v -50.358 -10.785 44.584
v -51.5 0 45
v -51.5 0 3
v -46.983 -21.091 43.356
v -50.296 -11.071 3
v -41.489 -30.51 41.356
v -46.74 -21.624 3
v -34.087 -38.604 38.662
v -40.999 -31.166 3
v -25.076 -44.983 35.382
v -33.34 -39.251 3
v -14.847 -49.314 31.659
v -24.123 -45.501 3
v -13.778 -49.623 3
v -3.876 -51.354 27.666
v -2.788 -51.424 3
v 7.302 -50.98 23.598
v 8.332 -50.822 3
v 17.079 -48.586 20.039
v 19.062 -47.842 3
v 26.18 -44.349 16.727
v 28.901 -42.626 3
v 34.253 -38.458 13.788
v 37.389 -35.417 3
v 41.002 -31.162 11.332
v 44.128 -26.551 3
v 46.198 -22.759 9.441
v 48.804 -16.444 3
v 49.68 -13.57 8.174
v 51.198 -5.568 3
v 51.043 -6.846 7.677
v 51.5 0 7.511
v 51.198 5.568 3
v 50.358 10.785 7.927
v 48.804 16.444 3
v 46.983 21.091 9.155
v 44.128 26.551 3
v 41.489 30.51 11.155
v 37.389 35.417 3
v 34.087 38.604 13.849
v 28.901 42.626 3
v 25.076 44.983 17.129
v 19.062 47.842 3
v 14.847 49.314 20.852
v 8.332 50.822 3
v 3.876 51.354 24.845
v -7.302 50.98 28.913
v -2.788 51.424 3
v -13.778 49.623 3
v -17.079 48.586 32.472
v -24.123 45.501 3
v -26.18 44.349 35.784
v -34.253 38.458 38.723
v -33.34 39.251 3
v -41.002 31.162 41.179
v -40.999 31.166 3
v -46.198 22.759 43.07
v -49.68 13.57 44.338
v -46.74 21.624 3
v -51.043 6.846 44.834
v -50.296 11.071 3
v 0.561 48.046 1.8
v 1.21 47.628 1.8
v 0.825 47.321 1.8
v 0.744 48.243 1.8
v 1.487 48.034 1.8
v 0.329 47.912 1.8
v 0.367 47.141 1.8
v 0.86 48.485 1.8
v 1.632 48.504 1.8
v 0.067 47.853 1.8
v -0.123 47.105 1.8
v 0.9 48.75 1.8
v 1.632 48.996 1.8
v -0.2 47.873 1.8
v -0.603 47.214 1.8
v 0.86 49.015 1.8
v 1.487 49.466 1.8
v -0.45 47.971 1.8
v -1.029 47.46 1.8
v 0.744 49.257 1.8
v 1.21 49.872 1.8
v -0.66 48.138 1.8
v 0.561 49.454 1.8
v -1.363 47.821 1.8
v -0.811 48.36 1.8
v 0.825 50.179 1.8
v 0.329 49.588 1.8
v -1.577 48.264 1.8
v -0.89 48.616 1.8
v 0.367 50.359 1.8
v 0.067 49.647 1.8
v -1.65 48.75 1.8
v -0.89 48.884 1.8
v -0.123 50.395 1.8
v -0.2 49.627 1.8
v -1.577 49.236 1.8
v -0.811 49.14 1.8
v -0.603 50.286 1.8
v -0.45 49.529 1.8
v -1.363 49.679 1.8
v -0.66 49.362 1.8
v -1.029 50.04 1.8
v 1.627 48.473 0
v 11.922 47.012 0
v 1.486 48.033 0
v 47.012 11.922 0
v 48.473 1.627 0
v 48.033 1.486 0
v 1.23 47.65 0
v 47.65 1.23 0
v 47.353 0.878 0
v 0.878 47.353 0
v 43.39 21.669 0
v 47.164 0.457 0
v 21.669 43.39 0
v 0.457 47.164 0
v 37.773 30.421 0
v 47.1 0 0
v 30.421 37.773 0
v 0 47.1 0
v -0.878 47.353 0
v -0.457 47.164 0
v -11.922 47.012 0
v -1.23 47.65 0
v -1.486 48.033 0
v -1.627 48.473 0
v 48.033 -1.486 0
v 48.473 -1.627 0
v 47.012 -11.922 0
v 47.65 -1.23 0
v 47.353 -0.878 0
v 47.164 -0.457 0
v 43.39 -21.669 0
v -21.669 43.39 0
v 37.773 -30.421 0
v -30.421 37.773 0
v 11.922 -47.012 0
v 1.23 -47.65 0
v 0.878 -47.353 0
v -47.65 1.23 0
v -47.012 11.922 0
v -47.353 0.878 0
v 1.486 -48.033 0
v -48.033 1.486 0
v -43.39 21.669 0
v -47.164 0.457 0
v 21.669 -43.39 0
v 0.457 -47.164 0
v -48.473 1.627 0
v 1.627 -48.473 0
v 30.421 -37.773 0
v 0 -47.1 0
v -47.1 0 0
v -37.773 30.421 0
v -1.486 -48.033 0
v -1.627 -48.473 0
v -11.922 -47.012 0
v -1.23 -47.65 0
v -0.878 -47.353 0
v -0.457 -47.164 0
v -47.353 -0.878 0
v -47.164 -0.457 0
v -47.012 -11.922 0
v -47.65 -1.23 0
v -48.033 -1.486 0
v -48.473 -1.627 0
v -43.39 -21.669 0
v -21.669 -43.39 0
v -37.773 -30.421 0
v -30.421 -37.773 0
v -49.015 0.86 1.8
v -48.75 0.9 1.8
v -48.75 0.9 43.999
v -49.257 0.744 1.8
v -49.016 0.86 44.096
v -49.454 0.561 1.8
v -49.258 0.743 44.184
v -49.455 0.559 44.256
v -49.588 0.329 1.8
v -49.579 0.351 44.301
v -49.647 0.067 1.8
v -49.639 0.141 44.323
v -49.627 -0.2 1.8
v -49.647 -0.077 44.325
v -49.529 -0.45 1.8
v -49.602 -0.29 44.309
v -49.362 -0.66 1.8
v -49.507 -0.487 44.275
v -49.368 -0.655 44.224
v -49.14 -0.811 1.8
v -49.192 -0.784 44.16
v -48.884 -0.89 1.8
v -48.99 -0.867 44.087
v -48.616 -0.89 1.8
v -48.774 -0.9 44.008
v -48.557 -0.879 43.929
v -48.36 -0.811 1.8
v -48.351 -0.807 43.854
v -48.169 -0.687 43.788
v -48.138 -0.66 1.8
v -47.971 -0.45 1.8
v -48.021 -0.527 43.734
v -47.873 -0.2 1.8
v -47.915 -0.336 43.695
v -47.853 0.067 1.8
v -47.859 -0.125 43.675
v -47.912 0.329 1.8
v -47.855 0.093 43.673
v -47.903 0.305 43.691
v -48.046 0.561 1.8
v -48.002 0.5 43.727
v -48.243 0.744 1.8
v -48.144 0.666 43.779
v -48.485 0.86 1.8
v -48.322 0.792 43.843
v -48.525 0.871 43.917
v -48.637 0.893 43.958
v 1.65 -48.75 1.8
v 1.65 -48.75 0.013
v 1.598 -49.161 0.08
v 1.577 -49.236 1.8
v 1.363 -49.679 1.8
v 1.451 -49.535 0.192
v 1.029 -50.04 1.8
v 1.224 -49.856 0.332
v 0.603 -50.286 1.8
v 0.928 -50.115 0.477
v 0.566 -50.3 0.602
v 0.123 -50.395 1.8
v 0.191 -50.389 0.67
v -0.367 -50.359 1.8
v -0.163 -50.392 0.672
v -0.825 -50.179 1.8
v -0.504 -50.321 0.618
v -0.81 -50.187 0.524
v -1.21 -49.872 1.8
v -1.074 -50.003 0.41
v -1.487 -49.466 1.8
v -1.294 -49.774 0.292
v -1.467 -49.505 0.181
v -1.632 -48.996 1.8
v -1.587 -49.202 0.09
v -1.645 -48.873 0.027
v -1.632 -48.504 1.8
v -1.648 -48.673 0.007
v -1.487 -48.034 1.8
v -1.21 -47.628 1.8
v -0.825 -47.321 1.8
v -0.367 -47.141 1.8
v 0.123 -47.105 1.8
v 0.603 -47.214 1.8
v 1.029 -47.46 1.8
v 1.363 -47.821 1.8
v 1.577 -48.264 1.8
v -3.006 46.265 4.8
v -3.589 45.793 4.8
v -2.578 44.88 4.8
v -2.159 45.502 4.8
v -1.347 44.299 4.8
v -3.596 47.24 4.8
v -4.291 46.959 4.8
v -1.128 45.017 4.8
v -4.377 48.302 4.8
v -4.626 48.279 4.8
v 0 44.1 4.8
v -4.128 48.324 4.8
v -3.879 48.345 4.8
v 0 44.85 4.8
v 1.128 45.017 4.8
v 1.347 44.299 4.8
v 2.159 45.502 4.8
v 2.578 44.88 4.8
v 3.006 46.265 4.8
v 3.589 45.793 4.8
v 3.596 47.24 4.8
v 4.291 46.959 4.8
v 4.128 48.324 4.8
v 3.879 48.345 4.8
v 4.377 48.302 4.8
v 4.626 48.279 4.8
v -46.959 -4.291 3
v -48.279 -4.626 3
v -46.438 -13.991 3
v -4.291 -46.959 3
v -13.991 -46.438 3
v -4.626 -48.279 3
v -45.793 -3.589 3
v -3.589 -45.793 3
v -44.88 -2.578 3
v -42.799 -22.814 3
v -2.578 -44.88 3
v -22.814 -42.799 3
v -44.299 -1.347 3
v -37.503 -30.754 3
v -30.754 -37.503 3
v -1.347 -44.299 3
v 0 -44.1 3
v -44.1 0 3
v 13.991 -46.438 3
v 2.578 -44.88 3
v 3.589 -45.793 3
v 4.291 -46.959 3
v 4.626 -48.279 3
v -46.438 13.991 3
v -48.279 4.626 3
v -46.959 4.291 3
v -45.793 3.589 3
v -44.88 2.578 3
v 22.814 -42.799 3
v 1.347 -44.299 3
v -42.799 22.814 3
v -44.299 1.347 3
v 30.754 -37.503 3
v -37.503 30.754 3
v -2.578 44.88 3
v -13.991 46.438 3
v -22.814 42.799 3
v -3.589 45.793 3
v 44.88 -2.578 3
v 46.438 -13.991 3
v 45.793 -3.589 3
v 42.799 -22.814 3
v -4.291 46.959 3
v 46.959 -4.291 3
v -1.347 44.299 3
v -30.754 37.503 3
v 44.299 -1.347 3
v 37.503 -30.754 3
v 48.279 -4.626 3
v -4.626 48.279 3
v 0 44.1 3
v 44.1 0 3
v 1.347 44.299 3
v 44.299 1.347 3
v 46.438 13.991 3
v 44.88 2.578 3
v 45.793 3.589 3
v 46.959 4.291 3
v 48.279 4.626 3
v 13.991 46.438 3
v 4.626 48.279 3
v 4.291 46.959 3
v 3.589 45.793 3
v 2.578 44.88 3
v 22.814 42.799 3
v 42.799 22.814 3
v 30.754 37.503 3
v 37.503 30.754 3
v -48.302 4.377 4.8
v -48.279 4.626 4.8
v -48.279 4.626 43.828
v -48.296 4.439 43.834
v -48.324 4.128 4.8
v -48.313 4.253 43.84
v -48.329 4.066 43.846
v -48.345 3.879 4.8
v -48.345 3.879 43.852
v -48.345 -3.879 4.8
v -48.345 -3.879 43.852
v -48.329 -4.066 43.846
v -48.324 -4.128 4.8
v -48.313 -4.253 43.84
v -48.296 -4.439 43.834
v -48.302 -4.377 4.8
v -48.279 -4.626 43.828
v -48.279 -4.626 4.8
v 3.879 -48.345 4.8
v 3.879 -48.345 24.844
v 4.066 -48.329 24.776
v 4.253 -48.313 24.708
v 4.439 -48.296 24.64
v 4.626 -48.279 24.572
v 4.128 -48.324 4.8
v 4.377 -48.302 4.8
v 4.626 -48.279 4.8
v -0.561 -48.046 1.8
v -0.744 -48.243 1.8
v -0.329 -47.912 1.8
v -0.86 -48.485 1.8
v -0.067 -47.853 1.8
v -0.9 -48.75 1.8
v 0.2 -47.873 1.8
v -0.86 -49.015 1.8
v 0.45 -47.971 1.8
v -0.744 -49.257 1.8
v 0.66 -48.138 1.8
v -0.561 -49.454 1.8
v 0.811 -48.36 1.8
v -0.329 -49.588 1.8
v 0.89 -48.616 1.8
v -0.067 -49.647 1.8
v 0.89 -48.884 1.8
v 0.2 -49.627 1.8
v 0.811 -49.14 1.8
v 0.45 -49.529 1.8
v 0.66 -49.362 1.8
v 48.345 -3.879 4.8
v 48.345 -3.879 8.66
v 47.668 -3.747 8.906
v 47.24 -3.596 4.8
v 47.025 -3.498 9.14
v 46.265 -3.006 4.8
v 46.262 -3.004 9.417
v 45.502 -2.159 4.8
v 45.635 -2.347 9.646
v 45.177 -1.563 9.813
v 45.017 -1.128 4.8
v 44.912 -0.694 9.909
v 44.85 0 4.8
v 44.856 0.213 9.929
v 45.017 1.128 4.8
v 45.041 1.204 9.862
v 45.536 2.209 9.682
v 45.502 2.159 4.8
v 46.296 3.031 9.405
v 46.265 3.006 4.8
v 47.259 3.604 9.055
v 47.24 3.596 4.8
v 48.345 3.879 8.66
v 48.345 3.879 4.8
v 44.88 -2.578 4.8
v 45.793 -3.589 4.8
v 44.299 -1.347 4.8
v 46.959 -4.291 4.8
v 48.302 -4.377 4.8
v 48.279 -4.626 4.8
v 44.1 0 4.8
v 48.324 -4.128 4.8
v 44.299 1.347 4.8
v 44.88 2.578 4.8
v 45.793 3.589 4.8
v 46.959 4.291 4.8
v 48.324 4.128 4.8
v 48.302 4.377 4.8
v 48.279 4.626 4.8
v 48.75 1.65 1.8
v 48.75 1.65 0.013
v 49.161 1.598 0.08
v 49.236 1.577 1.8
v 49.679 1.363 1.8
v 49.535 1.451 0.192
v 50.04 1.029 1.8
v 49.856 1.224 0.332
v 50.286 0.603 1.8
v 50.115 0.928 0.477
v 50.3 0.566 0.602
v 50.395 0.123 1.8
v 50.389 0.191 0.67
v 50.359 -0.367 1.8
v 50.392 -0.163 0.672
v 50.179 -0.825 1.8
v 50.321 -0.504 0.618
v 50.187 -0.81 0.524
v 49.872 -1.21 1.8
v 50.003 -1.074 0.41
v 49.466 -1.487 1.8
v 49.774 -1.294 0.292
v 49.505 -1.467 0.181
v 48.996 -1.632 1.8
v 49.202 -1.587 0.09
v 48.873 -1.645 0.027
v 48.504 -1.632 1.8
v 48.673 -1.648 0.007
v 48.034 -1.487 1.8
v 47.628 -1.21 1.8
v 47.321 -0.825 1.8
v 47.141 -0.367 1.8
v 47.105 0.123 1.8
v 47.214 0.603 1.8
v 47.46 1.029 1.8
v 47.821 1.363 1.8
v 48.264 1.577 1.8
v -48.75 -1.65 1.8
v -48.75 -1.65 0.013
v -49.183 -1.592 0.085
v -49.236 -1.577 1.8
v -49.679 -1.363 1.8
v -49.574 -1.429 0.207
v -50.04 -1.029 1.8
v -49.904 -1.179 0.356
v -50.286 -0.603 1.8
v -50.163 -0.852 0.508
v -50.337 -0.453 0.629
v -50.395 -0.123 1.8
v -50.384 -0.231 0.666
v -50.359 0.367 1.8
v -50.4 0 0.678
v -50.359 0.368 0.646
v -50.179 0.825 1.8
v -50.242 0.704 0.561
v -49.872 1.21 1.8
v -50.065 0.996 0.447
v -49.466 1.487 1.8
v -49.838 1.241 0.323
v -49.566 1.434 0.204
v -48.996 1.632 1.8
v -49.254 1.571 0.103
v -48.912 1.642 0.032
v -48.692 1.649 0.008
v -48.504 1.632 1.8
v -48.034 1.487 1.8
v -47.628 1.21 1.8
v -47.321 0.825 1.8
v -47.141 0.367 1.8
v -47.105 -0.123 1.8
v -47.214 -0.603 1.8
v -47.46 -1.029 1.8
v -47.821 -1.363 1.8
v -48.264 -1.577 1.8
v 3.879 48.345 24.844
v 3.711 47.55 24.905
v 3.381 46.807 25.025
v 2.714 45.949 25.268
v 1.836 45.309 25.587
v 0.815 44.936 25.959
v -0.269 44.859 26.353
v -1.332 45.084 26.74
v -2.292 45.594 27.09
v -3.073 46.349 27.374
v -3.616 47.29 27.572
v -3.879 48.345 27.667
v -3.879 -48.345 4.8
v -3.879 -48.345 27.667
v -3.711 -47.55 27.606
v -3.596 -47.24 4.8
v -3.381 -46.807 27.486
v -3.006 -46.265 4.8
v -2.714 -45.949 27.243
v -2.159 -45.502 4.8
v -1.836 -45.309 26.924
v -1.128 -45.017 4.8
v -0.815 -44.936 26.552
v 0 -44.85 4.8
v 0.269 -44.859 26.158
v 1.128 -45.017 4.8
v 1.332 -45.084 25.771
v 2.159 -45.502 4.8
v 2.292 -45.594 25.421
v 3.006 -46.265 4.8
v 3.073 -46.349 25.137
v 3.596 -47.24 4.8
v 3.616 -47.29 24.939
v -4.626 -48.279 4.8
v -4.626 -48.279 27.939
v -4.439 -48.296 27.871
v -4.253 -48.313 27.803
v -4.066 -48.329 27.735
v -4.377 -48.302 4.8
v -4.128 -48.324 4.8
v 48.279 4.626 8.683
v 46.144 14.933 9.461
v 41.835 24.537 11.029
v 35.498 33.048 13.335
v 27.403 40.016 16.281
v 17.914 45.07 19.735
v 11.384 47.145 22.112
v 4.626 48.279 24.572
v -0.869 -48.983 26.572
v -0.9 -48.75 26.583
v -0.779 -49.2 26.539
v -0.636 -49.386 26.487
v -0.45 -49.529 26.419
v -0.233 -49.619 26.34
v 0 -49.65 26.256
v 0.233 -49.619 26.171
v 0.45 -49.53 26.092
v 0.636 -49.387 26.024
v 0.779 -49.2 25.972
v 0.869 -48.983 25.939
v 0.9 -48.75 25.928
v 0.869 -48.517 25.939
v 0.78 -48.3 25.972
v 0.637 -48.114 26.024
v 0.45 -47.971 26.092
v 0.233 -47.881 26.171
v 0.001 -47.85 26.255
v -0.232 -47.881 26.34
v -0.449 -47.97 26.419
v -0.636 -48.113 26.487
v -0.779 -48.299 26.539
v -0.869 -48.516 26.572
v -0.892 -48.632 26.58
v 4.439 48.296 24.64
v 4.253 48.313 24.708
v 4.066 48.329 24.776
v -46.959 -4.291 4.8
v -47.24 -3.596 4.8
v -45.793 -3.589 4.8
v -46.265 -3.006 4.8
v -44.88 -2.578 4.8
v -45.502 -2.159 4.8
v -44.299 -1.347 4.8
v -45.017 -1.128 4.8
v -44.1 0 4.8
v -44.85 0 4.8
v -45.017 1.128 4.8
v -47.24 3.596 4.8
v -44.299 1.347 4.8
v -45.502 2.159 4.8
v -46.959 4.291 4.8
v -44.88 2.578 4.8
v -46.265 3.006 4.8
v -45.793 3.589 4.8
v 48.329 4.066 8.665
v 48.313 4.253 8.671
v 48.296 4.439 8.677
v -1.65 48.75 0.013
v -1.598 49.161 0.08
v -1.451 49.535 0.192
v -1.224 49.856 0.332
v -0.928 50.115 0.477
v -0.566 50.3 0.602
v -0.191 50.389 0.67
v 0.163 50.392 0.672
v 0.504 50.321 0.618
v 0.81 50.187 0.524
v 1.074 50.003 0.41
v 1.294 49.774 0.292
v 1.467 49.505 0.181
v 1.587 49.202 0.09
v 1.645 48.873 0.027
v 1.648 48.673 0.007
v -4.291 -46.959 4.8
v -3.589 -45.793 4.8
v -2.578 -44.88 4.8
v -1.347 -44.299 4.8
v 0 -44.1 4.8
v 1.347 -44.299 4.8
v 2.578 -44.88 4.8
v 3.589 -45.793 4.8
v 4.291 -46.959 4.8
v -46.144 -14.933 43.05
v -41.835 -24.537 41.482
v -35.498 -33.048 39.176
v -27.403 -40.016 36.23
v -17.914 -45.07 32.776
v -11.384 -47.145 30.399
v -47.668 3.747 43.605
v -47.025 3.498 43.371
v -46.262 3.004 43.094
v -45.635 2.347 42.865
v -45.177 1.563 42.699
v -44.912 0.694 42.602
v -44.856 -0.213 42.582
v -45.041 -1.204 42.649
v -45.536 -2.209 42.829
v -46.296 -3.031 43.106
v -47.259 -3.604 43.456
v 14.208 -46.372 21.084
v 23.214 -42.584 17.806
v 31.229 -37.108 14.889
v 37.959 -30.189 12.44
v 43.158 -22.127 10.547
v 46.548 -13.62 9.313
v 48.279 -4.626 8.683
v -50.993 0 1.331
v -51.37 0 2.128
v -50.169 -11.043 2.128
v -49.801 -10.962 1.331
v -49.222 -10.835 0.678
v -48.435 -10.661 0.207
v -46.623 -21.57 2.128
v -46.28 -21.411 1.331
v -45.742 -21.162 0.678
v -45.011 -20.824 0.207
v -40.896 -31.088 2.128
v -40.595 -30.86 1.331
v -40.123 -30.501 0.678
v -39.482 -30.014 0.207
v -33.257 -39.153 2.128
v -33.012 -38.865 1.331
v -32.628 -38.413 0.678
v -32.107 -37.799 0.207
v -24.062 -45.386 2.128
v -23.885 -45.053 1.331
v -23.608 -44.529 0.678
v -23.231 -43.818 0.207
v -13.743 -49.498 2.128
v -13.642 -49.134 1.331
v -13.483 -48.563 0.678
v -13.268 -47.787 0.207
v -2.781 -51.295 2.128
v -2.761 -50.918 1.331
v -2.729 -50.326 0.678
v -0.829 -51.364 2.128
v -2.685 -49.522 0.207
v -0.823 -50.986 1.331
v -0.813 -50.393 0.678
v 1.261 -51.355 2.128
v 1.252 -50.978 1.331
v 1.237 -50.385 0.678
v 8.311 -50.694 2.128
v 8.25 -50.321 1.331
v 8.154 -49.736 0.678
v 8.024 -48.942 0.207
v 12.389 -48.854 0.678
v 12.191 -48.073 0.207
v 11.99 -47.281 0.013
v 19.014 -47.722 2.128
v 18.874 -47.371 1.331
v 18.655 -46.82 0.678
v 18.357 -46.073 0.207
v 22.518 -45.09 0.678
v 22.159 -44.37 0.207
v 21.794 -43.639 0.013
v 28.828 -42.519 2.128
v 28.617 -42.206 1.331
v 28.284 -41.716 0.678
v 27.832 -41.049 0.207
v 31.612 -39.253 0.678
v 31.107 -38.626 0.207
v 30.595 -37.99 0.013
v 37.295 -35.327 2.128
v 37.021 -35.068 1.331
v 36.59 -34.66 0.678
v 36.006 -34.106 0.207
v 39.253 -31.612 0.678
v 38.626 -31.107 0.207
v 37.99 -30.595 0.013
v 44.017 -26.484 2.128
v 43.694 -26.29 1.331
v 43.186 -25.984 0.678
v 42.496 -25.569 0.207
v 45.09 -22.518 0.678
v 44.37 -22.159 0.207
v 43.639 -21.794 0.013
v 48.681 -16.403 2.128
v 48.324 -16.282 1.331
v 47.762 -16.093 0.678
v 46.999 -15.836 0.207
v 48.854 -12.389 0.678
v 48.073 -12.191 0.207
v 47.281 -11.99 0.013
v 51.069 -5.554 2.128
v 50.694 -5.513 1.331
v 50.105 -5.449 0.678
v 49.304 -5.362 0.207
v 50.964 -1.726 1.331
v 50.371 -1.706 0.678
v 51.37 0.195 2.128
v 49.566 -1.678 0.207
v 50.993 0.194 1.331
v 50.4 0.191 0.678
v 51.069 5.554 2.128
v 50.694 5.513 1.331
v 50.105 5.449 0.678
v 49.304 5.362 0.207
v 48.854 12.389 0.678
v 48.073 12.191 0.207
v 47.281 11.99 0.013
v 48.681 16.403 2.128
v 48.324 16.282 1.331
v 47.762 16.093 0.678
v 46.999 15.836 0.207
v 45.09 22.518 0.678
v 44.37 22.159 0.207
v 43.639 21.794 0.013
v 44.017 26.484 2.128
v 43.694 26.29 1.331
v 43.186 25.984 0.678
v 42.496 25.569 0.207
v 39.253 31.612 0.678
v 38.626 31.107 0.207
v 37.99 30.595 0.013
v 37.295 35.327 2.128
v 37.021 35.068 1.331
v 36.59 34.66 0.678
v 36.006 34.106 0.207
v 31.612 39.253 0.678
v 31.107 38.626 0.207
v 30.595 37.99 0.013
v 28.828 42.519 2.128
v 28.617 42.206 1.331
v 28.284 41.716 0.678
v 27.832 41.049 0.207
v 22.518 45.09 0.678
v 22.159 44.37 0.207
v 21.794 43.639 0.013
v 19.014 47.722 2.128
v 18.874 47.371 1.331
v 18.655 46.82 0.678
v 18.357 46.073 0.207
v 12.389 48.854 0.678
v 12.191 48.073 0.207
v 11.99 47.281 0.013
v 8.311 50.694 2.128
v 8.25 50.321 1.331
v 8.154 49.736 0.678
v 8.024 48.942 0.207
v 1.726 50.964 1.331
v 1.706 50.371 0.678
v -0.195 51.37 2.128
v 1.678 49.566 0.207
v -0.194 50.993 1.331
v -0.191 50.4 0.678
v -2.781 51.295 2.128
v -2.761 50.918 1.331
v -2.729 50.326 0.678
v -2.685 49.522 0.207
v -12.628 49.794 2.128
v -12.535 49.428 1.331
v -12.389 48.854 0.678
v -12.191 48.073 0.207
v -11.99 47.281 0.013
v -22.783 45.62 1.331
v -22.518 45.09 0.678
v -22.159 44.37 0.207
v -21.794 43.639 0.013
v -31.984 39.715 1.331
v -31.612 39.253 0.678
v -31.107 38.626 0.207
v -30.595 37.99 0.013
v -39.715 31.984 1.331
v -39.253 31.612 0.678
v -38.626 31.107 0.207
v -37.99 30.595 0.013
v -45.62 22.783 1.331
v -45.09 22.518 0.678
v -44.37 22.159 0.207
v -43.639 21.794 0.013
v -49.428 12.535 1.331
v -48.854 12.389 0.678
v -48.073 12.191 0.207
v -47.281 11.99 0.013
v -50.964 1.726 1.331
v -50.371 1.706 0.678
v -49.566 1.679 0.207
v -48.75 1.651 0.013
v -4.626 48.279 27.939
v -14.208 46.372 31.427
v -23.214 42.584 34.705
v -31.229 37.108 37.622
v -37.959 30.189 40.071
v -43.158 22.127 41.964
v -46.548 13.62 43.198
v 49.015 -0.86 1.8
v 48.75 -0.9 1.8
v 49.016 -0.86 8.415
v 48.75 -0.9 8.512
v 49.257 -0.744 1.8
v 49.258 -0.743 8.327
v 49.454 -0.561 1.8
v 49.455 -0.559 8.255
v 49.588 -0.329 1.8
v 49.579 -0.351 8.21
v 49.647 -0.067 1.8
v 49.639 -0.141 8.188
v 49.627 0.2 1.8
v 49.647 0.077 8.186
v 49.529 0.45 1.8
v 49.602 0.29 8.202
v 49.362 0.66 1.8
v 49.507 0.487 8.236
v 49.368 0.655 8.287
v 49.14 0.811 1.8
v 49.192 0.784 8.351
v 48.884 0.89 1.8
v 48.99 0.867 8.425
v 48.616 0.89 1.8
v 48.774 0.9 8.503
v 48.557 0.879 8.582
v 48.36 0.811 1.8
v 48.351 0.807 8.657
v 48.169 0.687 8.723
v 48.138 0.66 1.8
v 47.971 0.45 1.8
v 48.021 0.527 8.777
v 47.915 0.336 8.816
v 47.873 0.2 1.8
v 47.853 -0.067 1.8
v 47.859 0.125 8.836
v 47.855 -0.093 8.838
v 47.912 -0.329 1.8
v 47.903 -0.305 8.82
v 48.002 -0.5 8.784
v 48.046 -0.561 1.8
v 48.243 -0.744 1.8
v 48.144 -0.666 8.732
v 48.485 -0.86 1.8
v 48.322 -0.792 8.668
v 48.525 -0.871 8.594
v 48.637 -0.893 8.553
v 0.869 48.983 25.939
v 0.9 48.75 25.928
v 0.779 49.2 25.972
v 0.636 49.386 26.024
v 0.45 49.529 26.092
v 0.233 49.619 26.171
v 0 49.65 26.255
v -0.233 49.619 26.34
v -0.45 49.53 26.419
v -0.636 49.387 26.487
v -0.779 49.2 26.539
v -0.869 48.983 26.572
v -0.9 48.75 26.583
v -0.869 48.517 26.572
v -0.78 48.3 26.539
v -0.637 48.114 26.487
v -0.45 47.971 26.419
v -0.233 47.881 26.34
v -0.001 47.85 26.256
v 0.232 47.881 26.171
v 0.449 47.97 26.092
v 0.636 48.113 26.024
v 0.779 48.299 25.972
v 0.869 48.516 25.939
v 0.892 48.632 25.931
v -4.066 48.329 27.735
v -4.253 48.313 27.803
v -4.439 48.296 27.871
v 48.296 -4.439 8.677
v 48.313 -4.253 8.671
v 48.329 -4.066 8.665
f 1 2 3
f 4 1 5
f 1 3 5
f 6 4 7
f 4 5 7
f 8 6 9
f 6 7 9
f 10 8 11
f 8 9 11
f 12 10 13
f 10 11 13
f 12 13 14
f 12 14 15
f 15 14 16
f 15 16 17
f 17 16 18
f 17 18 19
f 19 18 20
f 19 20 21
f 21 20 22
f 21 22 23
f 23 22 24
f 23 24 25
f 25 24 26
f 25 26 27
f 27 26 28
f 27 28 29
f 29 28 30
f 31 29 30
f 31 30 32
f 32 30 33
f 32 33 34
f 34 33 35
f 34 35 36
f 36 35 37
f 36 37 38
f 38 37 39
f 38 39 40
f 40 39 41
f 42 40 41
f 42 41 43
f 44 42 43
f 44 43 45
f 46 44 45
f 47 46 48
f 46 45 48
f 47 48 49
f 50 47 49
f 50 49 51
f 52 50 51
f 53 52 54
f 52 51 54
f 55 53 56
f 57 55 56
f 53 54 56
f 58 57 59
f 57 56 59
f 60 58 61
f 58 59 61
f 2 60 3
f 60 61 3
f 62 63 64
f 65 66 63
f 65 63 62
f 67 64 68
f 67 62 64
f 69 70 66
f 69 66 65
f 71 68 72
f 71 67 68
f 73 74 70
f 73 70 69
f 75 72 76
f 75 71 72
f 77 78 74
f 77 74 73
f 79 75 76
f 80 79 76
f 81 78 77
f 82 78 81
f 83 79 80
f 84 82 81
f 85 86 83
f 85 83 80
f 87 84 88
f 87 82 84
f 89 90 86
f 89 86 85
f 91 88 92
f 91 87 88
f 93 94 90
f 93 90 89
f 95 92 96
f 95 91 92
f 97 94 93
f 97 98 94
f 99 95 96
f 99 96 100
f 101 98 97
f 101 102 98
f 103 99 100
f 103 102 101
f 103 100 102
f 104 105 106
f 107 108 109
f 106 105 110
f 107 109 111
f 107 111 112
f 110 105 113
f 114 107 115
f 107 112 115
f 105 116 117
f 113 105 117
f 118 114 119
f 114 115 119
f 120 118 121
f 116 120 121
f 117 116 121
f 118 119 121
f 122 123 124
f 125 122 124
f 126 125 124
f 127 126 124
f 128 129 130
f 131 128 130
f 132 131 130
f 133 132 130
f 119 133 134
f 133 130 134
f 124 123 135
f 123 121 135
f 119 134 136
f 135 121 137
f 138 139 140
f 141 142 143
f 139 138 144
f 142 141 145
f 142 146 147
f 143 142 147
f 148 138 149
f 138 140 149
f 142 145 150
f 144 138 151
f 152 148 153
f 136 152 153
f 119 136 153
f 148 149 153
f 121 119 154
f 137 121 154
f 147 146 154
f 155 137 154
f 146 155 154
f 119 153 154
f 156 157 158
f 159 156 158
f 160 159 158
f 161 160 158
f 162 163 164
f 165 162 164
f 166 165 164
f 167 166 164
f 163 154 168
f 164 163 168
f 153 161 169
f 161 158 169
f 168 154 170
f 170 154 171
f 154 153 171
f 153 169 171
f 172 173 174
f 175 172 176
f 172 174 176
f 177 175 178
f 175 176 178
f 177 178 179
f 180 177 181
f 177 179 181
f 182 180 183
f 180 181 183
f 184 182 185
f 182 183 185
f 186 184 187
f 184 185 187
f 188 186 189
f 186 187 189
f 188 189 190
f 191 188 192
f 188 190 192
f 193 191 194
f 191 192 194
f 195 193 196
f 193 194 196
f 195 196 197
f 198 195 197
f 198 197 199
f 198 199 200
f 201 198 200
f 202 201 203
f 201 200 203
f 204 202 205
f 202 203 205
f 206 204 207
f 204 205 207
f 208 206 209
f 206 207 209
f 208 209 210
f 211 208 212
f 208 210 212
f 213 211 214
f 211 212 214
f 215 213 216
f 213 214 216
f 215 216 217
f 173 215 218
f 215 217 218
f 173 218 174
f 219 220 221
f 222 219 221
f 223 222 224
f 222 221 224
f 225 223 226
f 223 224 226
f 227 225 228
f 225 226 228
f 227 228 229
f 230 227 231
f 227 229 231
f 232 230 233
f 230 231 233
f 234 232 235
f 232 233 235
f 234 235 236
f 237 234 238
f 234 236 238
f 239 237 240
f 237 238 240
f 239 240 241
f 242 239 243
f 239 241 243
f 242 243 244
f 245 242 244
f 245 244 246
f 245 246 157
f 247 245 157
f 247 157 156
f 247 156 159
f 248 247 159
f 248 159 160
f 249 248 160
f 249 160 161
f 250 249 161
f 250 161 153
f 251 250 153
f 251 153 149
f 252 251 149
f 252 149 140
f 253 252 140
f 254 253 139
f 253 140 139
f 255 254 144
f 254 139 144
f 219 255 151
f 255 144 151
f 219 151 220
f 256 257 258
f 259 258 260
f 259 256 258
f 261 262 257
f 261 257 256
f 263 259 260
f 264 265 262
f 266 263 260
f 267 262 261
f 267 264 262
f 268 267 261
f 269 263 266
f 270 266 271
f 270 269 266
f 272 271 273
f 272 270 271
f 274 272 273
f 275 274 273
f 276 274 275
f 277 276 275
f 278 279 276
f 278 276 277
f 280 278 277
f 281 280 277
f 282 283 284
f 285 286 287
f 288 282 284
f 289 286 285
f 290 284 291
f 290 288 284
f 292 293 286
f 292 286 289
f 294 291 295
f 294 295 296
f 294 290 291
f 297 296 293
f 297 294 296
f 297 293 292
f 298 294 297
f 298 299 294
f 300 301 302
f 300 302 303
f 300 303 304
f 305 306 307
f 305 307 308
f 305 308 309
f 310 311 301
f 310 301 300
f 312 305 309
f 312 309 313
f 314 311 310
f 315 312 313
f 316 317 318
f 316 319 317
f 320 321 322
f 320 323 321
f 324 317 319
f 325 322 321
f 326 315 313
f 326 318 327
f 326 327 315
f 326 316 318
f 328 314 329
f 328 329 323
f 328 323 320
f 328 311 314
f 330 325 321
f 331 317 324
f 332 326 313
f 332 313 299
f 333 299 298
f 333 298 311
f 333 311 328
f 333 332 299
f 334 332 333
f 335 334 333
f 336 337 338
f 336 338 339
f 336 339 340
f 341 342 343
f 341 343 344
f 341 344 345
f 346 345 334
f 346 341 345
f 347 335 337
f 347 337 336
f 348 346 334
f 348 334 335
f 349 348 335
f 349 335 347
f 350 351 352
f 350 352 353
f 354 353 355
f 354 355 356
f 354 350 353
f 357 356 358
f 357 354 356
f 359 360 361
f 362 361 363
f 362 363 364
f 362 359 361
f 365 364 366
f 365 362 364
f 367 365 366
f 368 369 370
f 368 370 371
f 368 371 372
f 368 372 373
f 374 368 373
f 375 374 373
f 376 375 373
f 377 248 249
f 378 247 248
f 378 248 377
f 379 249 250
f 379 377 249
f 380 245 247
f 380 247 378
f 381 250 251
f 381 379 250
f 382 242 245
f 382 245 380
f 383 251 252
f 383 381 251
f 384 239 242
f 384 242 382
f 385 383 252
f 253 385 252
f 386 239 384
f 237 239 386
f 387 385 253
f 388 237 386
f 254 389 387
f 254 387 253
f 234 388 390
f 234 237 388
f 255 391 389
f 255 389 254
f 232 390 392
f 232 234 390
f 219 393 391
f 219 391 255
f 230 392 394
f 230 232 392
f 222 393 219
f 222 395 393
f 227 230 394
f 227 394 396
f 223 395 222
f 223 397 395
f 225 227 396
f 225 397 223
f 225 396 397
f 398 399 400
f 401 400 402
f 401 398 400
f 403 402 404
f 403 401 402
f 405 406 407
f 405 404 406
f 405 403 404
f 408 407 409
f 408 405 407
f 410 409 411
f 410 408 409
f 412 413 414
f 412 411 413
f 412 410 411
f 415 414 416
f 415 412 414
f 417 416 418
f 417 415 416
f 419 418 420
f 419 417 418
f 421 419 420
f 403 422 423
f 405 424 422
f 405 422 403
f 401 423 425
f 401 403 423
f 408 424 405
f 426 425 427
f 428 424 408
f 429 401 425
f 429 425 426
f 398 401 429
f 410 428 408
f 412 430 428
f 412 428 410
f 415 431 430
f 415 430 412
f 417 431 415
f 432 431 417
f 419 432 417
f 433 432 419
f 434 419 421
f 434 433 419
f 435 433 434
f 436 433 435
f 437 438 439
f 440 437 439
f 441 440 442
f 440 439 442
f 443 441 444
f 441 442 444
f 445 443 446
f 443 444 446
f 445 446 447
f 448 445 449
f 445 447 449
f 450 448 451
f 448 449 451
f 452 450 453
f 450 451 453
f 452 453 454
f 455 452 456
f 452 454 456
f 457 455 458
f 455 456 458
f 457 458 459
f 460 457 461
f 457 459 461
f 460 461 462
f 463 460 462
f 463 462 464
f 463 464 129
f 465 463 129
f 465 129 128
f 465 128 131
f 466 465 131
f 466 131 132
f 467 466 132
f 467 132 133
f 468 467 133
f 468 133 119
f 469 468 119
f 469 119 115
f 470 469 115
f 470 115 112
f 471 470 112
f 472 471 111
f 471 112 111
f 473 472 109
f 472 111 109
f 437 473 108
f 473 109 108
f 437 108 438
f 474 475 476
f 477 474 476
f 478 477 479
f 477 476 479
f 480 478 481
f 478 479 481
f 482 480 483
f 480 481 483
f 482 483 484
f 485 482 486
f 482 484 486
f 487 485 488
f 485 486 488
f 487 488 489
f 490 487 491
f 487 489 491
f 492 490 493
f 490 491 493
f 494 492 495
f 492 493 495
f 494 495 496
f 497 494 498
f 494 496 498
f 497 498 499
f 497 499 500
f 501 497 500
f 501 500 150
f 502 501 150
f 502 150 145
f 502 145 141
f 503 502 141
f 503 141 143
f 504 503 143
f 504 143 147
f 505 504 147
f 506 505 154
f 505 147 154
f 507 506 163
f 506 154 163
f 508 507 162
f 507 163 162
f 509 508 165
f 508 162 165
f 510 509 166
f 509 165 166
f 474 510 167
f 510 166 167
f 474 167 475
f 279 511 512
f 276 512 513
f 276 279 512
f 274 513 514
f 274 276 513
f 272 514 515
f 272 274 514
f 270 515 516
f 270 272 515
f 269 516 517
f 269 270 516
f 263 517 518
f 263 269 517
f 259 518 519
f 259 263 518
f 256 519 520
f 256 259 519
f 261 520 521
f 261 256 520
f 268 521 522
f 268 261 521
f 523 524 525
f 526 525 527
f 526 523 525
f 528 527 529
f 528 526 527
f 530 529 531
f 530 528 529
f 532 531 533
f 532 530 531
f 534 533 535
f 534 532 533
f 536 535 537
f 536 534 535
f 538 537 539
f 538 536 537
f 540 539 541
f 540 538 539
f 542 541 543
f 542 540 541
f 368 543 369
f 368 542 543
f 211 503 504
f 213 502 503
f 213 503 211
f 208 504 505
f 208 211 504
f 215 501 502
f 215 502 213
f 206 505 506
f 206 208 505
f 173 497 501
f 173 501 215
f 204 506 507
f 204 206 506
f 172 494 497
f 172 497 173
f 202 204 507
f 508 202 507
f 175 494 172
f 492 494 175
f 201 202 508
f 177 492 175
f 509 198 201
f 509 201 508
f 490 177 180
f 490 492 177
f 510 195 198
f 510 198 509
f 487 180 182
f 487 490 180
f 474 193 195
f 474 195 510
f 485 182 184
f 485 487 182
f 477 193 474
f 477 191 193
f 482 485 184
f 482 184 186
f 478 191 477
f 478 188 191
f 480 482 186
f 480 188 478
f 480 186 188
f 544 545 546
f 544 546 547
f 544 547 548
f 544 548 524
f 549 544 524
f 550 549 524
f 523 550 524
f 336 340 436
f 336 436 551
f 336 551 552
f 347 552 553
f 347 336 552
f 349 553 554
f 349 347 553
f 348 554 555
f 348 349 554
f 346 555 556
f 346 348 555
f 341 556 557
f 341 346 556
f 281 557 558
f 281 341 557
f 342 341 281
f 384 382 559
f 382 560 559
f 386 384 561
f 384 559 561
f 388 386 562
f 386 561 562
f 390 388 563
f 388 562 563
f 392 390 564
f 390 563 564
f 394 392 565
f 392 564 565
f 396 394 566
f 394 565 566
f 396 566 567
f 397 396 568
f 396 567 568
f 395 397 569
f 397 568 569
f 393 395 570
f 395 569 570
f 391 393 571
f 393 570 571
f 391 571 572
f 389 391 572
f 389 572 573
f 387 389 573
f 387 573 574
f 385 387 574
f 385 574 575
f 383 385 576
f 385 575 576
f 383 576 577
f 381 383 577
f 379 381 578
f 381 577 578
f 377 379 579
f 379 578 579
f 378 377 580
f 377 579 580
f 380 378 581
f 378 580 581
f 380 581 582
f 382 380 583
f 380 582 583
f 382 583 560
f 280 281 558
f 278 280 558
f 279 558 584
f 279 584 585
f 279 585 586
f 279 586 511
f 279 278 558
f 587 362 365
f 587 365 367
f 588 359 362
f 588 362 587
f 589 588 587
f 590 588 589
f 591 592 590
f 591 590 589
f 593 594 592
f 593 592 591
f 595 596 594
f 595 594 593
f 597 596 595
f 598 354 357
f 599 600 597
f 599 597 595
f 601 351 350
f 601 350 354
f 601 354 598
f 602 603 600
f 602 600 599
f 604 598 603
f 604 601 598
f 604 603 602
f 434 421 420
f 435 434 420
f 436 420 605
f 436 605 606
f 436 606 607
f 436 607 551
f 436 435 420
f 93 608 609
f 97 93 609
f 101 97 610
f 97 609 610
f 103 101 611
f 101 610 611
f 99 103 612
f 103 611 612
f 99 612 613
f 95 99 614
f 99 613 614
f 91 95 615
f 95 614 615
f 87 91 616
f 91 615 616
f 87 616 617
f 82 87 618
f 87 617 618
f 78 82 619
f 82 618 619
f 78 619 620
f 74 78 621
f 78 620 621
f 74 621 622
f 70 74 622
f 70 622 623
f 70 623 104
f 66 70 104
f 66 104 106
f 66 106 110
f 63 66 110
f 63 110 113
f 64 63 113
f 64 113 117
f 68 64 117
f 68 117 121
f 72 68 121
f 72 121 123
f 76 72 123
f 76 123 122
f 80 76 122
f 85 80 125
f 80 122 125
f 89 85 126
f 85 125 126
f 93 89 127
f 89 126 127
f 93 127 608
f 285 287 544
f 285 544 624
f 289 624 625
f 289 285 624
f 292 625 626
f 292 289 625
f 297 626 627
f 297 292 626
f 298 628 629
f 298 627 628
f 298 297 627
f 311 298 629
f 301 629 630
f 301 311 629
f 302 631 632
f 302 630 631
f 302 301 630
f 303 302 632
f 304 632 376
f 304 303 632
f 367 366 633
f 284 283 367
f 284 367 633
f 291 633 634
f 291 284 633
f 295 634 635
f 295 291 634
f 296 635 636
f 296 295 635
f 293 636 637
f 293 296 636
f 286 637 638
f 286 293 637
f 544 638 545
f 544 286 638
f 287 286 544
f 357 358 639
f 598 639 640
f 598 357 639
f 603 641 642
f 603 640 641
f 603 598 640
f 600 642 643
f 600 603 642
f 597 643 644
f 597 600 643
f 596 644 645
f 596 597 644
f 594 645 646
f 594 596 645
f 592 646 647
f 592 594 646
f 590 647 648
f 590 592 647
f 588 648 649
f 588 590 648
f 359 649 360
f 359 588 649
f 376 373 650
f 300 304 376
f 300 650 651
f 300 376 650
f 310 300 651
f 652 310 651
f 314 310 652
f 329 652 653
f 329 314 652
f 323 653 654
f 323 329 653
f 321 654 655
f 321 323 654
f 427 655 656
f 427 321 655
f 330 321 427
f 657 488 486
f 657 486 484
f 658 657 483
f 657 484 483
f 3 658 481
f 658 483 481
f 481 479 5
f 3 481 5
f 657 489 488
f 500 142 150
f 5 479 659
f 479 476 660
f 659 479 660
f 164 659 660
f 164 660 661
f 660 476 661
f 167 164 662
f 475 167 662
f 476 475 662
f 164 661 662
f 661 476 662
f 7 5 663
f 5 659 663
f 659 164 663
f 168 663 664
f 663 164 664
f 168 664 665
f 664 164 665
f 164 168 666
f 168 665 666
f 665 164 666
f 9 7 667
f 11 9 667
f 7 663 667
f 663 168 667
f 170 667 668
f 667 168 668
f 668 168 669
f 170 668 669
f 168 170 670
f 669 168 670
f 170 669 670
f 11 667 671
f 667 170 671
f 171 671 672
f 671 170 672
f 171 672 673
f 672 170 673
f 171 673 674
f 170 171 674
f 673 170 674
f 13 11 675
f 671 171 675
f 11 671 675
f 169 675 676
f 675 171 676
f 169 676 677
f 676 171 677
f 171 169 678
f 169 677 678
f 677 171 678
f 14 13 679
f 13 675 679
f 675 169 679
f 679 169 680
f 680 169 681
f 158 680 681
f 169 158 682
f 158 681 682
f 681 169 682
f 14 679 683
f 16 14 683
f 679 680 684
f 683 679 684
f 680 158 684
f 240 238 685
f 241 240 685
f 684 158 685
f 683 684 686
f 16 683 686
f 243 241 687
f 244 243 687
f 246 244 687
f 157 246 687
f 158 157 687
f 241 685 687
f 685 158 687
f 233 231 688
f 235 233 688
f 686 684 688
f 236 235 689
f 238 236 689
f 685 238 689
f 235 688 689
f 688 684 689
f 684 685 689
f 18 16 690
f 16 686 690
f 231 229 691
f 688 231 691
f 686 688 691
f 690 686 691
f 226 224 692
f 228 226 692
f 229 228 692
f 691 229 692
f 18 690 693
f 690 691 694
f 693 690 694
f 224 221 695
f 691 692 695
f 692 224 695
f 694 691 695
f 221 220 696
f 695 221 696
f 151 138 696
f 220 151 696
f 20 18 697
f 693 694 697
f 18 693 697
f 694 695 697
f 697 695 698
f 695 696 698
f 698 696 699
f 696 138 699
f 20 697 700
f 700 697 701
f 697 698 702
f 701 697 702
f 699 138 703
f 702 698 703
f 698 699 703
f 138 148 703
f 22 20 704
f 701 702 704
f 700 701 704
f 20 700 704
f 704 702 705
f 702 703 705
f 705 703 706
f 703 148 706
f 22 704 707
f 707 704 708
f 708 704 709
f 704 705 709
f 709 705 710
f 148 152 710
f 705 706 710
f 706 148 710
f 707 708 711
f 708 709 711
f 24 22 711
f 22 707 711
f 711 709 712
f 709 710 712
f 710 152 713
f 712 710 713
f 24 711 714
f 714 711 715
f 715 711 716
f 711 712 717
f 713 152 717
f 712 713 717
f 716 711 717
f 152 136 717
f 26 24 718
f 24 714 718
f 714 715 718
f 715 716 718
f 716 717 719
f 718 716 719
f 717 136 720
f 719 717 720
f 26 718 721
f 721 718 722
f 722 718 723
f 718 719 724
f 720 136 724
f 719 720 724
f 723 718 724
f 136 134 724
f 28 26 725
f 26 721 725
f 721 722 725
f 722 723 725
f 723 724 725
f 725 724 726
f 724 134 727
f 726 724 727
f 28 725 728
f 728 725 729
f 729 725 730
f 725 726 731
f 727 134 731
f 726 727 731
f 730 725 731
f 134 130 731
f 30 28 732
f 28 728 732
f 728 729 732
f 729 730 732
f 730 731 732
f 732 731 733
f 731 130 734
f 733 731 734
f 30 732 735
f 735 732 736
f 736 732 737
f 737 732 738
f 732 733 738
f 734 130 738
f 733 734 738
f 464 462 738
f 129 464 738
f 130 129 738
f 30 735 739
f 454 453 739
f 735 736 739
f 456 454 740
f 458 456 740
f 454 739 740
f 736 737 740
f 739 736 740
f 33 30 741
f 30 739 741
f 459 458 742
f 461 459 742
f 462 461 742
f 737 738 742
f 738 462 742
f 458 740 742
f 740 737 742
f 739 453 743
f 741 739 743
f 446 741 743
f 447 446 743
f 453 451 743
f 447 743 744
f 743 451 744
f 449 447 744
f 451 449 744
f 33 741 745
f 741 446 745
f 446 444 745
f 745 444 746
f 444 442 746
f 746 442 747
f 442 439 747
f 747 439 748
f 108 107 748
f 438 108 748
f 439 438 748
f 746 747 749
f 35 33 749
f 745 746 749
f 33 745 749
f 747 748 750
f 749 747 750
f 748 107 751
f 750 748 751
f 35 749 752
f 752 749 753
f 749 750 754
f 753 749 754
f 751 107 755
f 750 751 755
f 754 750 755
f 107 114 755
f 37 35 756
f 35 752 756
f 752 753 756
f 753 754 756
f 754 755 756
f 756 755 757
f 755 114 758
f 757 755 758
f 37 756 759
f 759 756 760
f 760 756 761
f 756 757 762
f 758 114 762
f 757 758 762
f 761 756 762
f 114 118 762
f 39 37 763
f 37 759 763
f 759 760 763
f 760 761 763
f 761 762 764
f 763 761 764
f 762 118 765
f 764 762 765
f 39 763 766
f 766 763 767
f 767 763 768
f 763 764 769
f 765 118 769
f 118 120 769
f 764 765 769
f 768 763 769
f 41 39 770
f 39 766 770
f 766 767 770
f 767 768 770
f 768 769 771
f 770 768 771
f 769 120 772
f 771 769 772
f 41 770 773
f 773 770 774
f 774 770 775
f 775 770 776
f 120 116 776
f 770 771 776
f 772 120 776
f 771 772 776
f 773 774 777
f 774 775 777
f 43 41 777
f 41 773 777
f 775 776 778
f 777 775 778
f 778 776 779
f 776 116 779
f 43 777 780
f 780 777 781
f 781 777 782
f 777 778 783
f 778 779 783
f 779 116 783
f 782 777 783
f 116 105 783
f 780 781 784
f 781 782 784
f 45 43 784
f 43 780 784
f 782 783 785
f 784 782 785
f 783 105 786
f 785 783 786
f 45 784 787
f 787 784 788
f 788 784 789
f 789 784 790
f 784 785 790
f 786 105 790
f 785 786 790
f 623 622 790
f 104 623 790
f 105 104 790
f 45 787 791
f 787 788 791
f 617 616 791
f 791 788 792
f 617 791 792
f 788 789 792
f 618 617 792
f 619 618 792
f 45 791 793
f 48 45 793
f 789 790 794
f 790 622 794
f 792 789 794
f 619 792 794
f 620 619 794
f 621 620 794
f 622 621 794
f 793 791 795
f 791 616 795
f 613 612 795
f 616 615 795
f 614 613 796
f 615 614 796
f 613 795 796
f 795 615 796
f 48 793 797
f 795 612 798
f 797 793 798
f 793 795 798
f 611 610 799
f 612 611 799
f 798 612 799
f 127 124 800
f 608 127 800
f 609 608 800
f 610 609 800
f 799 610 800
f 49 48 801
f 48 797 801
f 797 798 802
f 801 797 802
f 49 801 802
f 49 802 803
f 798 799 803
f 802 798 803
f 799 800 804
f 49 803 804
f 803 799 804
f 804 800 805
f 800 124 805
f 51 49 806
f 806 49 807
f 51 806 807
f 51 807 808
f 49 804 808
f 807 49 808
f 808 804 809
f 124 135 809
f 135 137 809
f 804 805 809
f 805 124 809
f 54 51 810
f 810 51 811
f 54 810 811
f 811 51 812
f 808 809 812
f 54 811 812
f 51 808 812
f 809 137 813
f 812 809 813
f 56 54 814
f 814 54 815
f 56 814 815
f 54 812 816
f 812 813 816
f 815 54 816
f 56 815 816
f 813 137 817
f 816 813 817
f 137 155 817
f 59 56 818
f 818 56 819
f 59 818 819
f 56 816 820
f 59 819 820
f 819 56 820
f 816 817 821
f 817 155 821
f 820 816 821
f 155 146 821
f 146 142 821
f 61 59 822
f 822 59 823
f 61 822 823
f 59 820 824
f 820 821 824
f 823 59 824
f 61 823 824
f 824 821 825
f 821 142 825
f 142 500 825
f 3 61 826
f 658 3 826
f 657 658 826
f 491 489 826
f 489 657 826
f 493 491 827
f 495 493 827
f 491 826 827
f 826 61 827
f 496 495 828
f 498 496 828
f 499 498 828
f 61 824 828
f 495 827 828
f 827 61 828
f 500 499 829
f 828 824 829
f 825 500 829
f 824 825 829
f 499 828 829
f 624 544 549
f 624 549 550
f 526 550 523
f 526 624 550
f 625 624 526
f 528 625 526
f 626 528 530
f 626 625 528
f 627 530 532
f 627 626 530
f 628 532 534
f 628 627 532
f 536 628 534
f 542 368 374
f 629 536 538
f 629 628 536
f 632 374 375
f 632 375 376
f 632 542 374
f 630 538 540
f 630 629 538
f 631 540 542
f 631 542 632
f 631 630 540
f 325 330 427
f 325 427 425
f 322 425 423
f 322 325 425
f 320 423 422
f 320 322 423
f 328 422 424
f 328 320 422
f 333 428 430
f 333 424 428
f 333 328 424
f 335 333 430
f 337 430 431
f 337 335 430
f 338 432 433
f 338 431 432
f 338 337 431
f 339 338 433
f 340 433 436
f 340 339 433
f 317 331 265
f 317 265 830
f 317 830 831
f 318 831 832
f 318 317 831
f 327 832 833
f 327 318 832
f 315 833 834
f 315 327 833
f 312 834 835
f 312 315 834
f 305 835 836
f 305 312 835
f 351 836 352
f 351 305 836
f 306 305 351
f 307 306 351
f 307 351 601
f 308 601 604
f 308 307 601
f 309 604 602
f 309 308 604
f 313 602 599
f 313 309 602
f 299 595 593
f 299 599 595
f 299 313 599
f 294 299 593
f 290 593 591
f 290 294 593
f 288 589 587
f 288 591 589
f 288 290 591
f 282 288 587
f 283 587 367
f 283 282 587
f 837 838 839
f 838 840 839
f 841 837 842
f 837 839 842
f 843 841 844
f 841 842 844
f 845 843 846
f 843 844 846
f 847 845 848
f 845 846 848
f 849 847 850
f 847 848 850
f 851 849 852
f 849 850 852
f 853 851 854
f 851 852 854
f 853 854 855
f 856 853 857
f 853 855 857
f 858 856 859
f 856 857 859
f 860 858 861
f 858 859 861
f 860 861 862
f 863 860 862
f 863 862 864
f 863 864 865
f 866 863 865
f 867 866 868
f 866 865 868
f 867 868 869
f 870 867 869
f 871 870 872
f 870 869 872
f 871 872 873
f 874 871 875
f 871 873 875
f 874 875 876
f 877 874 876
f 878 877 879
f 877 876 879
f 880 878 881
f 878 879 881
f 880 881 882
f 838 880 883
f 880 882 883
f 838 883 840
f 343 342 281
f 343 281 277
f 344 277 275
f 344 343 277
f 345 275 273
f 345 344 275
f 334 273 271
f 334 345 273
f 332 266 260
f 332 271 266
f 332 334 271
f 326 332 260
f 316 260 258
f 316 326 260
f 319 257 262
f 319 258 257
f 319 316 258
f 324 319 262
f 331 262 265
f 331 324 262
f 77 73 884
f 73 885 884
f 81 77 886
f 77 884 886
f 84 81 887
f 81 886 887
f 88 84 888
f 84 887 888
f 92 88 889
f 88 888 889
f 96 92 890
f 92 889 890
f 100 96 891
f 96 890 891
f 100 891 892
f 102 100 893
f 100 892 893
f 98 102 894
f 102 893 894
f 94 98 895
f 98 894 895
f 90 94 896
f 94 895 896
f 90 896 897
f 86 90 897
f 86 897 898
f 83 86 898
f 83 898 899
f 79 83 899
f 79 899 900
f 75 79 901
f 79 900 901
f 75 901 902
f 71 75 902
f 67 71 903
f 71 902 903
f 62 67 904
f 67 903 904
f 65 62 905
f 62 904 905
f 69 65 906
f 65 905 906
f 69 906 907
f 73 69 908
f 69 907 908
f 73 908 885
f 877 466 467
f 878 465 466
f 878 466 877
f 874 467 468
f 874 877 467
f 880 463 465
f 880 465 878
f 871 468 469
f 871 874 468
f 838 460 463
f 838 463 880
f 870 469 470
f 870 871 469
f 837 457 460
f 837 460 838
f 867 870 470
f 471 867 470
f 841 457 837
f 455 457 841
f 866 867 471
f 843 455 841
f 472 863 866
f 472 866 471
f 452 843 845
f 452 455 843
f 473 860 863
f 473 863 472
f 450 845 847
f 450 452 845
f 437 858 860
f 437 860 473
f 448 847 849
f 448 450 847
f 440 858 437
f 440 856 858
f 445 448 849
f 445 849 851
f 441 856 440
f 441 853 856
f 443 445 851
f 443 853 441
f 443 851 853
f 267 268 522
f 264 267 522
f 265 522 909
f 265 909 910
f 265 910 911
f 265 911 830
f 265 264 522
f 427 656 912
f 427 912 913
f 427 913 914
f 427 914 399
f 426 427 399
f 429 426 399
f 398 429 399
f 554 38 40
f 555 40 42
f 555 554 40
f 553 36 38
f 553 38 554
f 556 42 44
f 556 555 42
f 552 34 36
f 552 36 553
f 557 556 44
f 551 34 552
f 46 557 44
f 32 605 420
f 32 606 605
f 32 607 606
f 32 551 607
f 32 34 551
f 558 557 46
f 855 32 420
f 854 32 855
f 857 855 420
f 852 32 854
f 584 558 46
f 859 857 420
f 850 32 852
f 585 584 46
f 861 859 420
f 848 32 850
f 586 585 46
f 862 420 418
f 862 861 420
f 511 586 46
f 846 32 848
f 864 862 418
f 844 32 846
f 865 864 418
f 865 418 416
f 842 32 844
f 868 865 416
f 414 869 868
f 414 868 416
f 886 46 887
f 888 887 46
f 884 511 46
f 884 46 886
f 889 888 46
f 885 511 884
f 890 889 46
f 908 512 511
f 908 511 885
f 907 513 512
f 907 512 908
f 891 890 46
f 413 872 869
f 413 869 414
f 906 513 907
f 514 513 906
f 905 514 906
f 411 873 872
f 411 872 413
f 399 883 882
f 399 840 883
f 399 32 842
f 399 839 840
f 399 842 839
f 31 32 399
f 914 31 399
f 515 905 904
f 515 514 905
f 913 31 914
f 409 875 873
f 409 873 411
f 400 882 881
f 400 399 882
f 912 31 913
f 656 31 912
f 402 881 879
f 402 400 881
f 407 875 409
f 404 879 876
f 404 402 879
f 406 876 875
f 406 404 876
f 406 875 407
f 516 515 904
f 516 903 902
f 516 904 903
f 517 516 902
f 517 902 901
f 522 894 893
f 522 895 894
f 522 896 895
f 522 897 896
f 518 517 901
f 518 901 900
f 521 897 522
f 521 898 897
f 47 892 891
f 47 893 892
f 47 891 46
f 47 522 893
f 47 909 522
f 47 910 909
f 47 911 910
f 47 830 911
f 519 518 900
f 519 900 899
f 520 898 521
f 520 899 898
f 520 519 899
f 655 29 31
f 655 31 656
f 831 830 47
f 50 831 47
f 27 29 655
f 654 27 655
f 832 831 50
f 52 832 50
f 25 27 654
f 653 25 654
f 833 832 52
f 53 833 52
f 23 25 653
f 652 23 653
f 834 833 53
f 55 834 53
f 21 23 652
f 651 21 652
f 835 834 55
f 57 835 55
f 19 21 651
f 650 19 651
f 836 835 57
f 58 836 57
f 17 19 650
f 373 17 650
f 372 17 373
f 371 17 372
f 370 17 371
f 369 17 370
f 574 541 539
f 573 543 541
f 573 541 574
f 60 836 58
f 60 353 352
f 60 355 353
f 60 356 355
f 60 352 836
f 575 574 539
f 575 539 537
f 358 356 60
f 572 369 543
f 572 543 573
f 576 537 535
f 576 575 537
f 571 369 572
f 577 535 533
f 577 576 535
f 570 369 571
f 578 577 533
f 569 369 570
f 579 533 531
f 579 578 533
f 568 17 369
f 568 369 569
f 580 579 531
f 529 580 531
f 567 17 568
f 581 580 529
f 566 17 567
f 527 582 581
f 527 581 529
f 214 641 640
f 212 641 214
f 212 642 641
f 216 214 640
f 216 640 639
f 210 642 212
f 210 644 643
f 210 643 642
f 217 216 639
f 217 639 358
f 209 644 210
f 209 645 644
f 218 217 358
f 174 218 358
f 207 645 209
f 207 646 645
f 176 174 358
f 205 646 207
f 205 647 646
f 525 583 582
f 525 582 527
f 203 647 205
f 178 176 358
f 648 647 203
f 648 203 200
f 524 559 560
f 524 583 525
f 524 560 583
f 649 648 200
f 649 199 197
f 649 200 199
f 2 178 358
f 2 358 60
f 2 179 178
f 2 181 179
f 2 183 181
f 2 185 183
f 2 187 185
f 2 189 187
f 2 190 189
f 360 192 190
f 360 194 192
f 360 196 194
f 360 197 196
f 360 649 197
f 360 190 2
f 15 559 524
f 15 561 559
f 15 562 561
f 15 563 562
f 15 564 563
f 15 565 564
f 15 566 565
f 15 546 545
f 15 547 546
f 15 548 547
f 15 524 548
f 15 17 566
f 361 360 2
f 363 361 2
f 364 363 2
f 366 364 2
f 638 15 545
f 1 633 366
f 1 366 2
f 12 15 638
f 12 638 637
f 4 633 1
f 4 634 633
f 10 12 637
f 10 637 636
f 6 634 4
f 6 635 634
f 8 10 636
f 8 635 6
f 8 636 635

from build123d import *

# Parameters (mm, degrees)
SKETCH_1_R                = 51.5
EXTRUDE_1_DEPTH           = 45
CUT_EXTRUDE_1_DEPTH       = 86.612499087
CUT_EXTRUDE_1_DEPTH_BACK  = 86.612499087
FILLET_1_R                = 3
HOLE_WIZARD_1_D           = 1.8
HOLE_WIZARD_1_CBORE_D     = 3.3
HOLE_WIZARD_1_CBORE_DEPTH = 1.8
PATTERN_CIRCULAR_1_COUNT  = 4
SHELL_START               = 3
SHELL_5_DEPTH             = 40.851543255
SHELL_START_2             = 4.8
SHELL_5_2_DEPTH           = 39.051543255


# Read off the part's stored shape, not the designer's step: 抽壳5
with BuildPart() as part:
    # 草图1 → 凸台-拉伸1 (new body)
    with BuildSketch(Plane.XY):
        with Locations(Location((0, 0, 0), (0, 0, 180))):
            Circle(SKETCH_1_R)
    extrude(amount=EXTRUDE_1_DEPTH)

    # 草图2 → 切除-拉伸1 (cut, two sides: drawn at the far end of the back side and taken through both)
    with BuildSketch(Plane(origin=(0, 0, 0), x_dir=(1, 0, 0), z_dir=(0, 1, 0)).offset(-CUT_EXTRUDE_1_DEPTH_BACK)):
        Polygon((-51.5, -45), (51.5, -45), (51.5, -7.511065871), align=None)
    extrude(amount=CUT_EXTRUDE_1_DEPTH + CUT_EXTRUDE_1_DEPTH_BACK, mode=Mode.SUBTRACT)

    # 圆角1
    fillet_1_edges = [part.edges().sort_by_distance(p)[0] for p in [
        (51.5, 0, 0),
    ]]
    fillet(fillet_1_edges, radius=FILLET_1_R)

    # 打孔尺寸(%根据)内六角圆柱头螺钉的类型1 (through all)
    with Locations(Plane(origin=(0, 0, 0), x_dir=(-1, 0, 0), z_dir=(0, 0, -1))):
        with Locations((0, 48.75)):
            hole_wizard_1 = CounterBoreHole(HOLE_WIZARD_1_D / 2, HOLE_WIZARD_1_CBORE_D / 2, HOLE_WIZARD_1_CBORE_DEPTH)

    # 阵列(圆周)1: 打孔尺寸(%根据)内六角圆柱头螺钉的类型1 ×4 about axis
    pattern_circular_1_axis = Axis((0, 0, 0), (0, 0, 1))
    for i in range(1, PATTERN_CIRCULAR_1_COUNT):
        add(hole_wizard_1.rotate(pattern_circular_1_axis, i * 360 / PATTERN_CIRCULAR_1_COUNT), mode=Mode.SUBTRACT)

    # 抽壳5 outline → 抽壳5 (cut)
    with BuildSketch(Plane.XY.offset(SHELL_START)):
        with BuildLine():
            ThreePointArc((-48.278871795, -4.626071575), (-34.294678888, -34.294678888), (-4.626071575, -48.278871795))
            ThreePointArc((-4.626071575, -48.278871795), (0, -44.1), (4.626071575, -48.278871795))
            ThreePointArc((4.626071575, -48.278871795), (34.294678888, -34.294678888), (48.278871795, -4.626071575))
            ThreePointArc((48.278871795, -4.626071575), (44.1, 0), (48.278871795, 4.626071575))
            ThreePointArc((48.278871795, 4.626071575), (34.294678888, 34.294678888), (4.626071575, 48.278871795))
            ThreePointArc((4.626071575, 48.278871795), (0, 44.1), (-4.626071575, 48.278871795))
            ThreePointArc((-4.626071575, 48.278871795), (-34.294678888, 34.294678888), (-48.278871795, 4.626071575))
            ThreePointArc((-48.278871795, 4.626071575), (-44.1, 0), (-48.278871795, -4.626071575))
        make_face()
    extrude(amount=SHELL_5_DEPTH, mode=Mode.SUBTRACT)

    # Shell 5 2 outline → Shell 5 2 (cut)
    with BuildSketch(Plane.XY.offset(SHELL_START_2)):
        with BuildLine():
            ThreePointArc((4.626071575, -48.278871795), (0, -44.1), (-4.626071575, -48.278871795))
            ThreePointArc((-4.626071575, -48.278871795), (-4.252601262, -48.313200914), (-3.878876655, -48.344641026))
            ThreePointArc((-3.878876655, -48.344641026), (0, -44.85), (3.878876655, -48.344641026))
            ThreePointArc((3.878876655, -48.344641026), (4.252601262, -48.313200914), (4.626071575, -48.278871795))
        make_face()
        with BuildLine():
            ThreePointArc((-48.344641026, -3.878876655), (-48.313200914, -4.252601262), (-48.278871795, -4.626071575))
            ThreePointArc((-48.278871795, -4.626071575), (-44.1, 0), (-48.278871795, 4.626071575))
            ThreePointArc((-48.278871795, 4.626071575), (-48.313200914, 4.252601262), (-48.344641026, 3.878876655))
            ThreePointArc((-48.344641026, 3.878876655), (-44.85, 0), (-48.344641026, -3.878876655))
        make_face()
        with BuildLine():
            ThreePointArc((48.278871795, 4.626071575), (44.1, 0), (48.278871795, -4.626071575))
            ThreePointArc((48.278871795, -4.626071575), (48.313200914, -4.252601262), (48.344641026, -3.878876655))
            ThreePointArc((48.344641026, -3.878876655), (44.85, 0), (48.344641026, 3.878876655))
            ThreePointArc((48.344641026, 3.878876655), (48.313200914, 4.252601262), (48.278871795, 4.626071575))
        make_face()
        with BuildLine():
            ThreePointArc((-3.878876655, 48.344641026), (-4.252601262, 48.313200914), (-4.626071575, 48.278871795))
            ThreePointArc((-4.626071575, 48.278871795), (0, 44.1), (4.626071575, 48.278871795))
            ThreePointArc((4.626071575, 48.278871795), (4.252601262, 48.313200914), (3.878876655, 48.344641026))
            ThreePointArc((3.878876655, 48.344641026), (0, 44.85), (-3.878876655, 48.344641026))
        make_face()
    extrude(amount=SHELL_5_2_DEPTH, mode=Mode.SUBTRACT)


solid = part.part
